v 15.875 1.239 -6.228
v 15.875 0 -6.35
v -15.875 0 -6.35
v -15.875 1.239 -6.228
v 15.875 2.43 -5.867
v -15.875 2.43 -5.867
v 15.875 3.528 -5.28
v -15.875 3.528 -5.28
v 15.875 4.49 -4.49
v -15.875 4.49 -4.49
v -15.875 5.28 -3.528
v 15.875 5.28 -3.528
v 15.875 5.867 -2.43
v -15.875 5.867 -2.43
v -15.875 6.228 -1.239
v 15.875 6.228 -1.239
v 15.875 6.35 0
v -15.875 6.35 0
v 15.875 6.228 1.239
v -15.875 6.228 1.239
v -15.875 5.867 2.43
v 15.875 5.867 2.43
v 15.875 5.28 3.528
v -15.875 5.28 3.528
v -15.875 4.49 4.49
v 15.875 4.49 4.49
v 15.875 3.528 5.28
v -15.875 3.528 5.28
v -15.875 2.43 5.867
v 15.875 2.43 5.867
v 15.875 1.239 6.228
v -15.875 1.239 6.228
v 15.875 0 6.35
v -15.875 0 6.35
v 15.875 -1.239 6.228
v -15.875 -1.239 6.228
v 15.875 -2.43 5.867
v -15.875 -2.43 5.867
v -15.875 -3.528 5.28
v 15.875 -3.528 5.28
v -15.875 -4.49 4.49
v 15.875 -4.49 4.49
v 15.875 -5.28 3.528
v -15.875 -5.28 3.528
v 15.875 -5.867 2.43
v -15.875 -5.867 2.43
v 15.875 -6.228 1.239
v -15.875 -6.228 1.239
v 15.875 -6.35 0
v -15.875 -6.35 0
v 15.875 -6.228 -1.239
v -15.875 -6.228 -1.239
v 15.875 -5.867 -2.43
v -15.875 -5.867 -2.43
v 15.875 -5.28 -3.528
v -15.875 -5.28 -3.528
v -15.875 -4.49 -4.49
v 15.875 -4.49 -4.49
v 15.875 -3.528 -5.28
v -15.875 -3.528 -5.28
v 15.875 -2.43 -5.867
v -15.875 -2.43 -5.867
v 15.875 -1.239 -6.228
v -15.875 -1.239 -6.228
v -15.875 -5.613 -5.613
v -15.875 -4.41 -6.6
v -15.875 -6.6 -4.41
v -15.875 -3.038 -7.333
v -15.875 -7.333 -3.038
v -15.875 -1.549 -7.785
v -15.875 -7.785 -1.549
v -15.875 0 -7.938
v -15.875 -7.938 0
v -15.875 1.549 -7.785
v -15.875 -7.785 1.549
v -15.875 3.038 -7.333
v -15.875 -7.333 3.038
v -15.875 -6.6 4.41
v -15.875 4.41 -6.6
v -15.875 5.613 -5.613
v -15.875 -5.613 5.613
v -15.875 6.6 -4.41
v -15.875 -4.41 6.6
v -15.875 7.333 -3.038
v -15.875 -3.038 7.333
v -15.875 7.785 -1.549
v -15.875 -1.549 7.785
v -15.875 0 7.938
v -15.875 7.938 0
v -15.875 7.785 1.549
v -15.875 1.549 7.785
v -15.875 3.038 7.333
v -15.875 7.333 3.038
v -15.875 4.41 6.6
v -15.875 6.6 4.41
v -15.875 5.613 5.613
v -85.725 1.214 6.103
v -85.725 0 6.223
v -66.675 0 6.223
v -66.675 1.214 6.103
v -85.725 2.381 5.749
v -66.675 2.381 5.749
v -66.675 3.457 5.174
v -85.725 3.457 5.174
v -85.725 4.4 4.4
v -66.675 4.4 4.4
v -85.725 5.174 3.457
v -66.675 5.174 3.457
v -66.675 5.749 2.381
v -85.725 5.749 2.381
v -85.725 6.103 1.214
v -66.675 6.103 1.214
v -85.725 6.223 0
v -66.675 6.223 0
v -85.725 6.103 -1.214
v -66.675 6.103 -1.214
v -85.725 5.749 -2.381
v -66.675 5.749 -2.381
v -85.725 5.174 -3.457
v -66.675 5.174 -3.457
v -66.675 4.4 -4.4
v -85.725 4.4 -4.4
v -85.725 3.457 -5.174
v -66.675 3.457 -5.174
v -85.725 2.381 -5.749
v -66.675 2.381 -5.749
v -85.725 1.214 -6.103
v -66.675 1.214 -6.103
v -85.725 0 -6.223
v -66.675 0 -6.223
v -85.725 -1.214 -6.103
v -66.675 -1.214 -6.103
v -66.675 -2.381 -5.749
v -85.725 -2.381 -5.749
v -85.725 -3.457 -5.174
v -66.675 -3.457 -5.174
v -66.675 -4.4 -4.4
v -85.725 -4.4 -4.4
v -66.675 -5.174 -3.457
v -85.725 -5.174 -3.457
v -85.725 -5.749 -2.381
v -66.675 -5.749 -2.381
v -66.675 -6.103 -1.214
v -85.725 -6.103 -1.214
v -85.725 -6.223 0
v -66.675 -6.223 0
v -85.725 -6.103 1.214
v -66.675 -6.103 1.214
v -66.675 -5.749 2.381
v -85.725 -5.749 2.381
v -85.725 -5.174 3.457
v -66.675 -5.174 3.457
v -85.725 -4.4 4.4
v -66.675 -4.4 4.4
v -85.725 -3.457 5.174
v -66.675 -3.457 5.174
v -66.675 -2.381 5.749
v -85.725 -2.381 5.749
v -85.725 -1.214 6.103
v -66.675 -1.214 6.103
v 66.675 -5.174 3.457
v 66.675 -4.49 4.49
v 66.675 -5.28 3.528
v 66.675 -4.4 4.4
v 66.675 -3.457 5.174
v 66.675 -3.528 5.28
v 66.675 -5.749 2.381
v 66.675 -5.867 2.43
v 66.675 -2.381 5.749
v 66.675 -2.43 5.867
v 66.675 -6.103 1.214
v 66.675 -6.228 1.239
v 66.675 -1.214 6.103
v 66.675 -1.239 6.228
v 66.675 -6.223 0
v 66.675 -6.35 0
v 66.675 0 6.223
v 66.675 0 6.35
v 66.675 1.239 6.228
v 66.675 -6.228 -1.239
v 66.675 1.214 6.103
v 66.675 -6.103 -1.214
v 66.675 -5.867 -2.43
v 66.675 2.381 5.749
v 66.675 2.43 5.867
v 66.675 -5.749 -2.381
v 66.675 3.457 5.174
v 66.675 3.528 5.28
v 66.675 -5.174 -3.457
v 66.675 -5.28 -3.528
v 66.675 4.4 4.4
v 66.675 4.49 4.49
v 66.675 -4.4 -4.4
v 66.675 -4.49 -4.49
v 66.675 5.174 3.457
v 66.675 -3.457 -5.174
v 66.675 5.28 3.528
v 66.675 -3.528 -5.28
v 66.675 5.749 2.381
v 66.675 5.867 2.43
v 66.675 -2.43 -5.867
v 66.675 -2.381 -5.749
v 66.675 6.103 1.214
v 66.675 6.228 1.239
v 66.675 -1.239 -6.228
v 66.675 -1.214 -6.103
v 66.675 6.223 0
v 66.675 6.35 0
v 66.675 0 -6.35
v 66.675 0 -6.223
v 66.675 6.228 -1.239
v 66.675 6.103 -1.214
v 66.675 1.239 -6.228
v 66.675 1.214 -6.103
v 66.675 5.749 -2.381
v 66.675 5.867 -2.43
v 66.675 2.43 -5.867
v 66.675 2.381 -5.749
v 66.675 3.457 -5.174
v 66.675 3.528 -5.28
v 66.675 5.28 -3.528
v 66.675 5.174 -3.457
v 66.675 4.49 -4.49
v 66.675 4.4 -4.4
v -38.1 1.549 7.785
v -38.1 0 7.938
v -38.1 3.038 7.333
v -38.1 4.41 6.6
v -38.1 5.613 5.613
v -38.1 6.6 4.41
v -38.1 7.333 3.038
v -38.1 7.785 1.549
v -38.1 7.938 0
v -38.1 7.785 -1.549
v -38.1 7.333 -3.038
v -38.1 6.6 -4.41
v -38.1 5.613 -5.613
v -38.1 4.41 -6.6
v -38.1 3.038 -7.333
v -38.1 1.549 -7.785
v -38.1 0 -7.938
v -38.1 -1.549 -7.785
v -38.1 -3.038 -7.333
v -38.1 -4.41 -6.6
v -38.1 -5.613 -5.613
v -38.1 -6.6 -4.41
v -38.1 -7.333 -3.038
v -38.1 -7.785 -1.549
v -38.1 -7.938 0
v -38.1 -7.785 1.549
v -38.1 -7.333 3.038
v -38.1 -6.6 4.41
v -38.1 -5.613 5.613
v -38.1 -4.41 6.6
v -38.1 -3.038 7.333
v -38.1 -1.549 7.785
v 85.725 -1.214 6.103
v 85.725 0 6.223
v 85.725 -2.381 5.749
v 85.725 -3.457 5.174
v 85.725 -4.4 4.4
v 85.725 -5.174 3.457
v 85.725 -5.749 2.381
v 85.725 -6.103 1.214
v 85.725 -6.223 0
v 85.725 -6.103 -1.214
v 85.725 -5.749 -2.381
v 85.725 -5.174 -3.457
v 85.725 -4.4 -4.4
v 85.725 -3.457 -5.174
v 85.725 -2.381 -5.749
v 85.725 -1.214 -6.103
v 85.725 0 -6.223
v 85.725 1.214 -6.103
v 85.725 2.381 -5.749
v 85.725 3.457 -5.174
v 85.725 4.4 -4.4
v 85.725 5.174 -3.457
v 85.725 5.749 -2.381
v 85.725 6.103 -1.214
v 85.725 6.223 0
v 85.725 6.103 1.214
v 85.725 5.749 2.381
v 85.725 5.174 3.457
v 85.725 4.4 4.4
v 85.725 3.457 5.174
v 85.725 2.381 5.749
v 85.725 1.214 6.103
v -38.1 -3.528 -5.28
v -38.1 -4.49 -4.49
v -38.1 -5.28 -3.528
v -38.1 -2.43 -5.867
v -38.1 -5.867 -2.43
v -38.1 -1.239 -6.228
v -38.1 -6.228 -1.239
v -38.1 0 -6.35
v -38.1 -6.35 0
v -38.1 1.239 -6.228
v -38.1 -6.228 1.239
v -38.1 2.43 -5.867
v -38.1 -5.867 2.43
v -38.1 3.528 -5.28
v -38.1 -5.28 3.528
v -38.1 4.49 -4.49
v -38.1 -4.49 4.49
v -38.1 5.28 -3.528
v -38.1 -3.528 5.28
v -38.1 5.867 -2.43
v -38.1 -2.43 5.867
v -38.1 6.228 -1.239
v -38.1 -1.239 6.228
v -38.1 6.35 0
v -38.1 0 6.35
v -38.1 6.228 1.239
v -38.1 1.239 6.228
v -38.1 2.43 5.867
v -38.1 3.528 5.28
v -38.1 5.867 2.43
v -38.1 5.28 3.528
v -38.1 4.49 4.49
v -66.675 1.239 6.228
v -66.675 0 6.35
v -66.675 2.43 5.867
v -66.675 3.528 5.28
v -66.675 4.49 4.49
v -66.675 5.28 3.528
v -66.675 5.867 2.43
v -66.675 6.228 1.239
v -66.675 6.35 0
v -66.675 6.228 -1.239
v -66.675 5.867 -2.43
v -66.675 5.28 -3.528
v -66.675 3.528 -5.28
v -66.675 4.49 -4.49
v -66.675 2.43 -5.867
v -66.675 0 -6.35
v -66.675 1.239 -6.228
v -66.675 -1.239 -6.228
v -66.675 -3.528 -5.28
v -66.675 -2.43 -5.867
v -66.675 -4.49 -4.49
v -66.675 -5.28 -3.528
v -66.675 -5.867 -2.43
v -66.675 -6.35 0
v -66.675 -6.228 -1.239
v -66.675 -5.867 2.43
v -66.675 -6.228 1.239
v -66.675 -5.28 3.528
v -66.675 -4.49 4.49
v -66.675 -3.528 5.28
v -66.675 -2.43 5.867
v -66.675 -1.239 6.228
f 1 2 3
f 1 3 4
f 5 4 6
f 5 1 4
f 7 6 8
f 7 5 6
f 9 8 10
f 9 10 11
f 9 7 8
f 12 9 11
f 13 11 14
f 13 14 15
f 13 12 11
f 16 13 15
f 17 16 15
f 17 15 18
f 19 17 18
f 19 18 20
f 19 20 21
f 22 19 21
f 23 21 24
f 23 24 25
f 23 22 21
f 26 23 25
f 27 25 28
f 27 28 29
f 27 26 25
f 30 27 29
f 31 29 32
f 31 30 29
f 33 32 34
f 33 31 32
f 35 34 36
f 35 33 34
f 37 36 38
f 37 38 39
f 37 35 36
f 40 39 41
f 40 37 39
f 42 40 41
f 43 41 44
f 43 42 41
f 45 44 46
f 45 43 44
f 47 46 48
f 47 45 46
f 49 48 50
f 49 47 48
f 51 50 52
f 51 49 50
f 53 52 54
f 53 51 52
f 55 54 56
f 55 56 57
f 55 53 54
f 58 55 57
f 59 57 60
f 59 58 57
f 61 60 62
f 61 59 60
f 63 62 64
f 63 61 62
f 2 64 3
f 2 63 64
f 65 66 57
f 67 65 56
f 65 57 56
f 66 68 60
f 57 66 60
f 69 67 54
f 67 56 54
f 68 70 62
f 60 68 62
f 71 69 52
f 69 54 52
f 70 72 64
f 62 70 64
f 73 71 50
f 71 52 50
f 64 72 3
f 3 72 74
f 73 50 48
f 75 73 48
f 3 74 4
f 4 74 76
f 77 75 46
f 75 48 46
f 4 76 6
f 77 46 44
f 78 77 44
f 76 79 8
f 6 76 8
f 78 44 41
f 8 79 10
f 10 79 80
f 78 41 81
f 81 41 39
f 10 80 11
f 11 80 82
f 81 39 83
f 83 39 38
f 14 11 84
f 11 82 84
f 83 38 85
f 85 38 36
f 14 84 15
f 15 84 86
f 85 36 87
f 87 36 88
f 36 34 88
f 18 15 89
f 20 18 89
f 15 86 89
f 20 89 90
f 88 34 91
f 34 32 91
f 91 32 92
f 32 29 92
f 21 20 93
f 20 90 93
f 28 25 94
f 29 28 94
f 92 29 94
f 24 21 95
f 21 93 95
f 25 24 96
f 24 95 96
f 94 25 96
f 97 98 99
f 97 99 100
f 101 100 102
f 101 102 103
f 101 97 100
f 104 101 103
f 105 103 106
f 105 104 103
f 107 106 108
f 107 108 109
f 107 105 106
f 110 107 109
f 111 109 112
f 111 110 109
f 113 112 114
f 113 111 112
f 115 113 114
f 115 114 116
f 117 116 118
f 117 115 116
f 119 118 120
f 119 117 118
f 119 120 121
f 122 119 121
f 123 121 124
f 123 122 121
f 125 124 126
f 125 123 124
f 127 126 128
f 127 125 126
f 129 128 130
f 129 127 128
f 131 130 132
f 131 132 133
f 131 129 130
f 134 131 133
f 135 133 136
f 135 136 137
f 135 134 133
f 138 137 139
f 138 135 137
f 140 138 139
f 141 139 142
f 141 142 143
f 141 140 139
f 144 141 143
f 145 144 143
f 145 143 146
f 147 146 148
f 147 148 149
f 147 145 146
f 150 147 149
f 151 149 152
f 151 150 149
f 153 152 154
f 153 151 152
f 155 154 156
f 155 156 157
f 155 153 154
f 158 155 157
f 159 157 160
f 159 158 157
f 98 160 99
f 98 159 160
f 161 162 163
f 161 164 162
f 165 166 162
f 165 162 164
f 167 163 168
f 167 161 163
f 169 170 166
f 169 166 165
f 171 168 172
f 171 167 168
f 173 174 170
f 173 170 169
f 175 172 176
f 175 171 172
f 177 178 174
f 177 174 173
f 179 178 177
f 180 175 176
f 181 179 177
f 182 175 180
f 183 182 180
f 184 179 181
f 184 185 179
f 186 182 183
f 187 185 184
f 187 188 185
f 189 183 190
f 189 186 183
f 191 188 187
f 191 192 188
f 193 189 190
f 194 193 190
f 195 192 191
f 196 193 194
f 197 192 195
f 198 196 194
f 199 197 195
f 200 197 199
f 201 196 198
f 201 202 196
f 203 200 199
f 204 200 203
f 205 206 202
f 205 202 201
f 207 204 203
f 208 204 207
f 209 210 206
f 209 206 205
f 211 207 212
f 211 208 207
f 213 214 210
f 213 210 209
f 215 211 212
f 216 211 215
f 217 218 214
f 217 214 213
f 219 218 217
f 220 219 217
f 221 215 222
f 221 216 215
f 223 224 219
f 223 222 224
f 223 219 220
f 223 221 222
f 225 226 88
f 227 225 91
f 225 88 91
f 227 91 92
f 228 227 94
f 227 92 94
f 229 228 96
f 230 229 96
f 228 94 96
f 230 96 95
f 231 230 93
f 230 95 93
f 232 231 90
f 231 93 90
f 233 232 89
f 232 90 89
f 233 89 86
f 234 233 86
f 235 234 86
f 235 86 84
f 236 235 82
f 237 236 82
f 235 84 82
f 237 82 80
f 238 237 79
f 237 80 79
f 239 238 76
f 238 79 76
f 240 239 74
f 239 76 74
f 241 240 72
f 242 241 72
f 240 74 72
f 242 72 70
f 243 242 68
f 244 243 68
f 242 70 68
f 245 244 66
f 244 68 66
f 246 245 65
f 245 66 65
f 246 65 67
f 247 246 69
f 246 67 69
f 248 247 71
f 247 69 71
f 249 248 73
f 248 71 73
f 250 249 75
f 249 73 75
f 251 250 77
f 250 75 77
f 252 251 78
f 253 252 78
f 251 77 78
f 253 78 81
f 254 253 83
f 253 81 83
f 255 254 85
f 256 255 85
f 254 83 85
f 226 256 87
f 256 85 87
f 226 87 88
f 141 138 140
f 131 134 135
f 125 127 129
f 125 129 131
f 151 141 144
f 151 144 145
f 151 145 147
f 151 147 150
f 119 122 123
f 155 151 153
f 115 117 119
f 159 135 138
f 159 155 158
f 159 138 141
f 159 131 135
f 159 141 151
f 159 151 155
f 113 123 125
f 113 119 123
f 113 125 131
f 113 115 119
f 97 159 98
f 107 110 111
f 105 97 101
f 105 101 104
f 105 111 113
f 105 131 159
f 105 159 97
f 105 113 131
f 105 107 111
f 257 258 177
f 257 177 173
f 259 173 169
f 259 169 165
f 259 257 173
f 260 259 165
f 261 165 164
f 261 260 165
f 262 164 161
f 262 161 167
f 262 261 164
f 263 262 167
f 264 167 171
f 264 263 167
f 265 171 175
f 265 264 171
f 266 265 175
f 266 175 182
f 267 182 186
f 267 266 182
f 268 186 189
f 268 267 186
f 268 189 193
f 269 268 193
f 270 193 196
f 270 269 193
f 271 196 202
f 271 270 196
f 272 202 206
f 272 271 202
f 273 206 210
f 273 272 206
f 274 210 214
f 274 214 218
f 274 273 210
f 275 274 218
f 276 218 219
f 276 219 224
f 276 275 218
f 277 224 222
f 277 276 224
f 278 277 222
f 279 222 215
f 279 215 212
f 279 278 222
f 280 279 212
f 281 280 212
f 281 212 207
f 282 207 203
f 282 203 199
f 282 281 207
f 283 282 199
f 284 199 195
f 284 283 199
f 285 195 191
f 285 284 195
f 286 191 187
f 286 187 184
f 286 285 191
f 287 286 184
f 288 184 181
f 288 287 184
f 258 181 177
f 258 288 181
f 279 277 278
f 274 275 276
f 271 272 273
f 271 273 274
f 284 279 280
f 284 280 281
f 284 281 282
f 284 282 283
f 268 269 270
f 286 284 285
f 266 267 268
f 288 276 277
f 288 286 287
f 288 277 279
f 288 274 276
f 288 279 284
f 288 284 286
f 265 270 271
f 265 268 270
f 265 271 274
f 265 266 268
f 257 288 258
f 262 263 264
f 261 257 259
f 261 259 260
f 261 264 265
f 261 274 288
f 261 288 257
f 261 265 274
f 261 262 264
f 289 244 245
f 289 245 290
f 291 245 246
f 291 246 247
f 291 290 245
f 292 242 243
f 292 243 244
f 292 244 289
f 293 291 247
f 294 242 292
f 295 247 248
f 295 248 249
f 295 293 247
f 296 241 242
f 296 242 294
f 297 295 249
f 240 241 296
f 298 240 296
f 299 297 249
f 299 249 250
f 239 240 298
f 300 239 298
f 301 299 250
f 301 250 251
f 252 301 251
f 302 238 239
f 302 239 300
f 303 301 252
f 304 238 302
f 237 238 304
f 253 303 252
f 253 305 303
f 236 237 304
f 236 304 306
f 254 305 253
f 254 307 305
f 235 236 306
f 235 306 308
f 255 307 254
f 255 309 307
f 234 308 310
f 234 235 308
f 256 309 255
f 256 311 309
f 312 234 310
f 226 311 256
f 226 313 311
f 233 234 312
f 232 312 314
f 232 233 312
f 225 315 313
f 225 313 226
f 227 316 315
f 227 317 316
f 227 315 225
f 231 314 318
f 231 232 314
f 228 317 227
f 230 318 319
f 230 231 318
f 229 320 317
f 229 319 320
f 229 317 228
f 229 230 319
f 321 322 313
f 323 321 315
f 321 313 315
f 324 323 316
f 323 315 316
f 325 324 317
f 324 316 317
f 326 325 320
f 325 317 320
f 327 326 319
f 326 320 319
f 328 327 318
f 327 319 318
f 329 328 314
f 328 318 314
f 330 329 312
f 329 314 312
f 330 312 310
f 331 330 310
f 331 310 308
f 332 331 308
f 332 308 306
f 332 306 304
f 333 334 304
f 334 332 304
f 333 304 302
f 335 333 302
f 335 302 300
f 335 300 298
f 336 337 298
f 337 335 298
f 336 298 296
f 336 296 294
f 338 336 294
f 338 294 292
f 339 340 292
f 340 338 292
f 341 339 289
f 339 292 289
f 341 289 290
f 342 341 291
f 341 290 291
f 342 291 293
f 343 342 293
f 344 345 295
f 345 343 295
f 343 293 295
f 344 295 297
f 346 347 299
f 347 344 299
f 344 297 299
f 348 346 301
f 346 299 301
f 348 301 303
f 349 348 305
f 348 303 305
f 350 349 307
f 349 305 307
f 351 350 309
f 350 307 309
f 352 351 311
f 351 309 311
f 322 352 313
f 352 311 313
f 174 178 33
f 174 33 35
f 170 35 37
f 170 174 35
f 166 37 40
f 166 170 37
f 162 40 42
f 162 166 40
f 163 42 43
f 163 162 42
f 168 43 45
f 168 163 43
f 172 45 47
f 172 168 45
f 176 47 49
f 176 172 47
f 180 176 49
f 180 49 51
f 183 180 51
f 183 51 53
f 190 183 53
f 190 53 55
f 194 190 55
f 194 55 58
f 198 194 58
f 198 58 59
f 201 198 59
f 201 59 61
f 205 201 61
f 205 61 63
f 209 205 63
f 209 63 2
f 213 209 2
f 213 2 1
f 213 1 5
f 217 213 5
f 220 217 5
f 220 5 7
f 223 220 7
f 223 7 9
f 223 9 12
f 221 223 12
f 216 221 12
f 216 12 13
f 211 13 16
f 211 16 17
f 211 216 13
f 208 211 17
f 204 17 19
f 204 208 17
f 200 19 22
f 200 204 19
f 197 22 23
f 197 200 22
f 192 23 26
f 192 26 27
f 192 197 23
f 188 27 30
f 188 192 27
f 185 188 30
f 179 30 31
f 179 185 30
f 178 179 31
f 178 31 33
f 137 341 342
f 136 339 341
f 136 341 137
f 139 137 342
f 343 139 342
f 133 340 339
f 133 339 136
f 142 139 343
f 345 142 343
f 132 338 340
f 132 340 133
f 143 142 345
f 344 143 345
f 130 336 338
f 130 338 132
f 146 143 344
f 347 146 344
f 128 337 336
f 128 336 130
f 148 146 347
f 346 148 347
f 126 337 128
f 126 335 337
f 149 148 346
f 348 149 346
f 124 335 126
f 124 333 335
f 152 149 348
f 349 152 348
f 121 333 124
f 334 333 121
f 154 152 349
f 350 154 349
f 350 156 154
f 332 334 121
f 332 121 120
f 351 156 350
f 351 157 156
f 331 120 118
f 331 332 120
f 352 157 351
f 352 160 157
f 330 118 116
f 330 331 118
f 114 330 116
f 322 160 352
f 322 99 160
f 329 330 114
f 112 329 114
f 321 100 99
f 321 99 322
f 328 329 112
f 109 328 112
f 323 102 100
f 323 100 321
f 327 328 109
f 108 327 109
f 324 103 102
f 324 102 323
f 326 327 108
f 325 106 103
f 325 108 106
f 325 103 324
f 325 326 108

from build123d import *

# Parameters (mm, degrees)
SKETCH1_R           = 6.35
BOSS_EXTRUDE1_DEPTH = 15.875
SKETCH2_R           = 7.9375
BOSS_EXTRUDE2_DEPTH = 22.225
BOSS_EXTRUDE3_START = 69.85
SKETCH3_R           = 6.35
BOSS_EXTRUDE3_DEPTH = 69.85
SKETCH4_R           = 6.35
BOSS_EXTRUDE4_DEPTH = 47.625
SKETCH5_OUTSIDE_W   = 52.458
SKETCH5_OUTSIDE_H   = 52.458
SKETCH5_OUTSIDE_R   = 6.223
CUT_EXTRUDE3_DEPTH  = 19.05
SKETCH6_OUTSIDE_W   = 52.458
SKETCH6_OUTSIDE_H   = 52.458
SKETCH6_OUTSIDE_R   = 6.223
CUT_EXTRUDE4_DEPTH  = 19.05


with BuildPart() as part:
    # Sketch1 → Boss-Extrude1 (new, symmetric)
    with BuildSketch(Plane(origin=(0, 0, 0), x_dir=(0, 0, -1), z_dir=(1, 0, 0))):
        Circle(SKETCH1_R)
    extrude(amount=BOSS_EXTRUDE1_DEPTH, both=True)

    # Sketch2 → Boss-Extrude2 (add)
    with BuildSketch(Plane.ZY.offset(15.875)):
        Circle(SKETCH2_R)
    extrude(amount=BOSS_EXTRUDE2_DEPTH)

    # Sketch3 → Boss-Extrude3 (add)
    with BuildSketch(Plane(origin=(15.875, 0, 0), x_dir=(0, 0, -1), z_dir=(1, 0, 0)).offset(BOSS_EXTRUDE3_START)):
        with Locations(Location((0, 0, 0), (0, 0, 180))):
            Circle(SKETCH3_R)
    extrude(amount=-BOSS_EXTRUDE3_DEPTH)

    # Sketch4 → Boss-Extrude4 (add)
    with BuildSketch(Plane.ZY.offset(38.1)):
        Circle(SKETCH4_R)
    extrude(amount=BOSS_EXTRUDE4_DEPTH)

    # Sketch5 outside → Cut-Extrude3 (cut)
    with BuildSketch(Plane.ZY.offset(85.725)):
        Rectangle(SKETCH5_OUTSIDE_W, SKETCH5_OUTSIDE_H)
        Circle(SKETCH5_OUTSIDE_R, mode=Mode.SUBTRACT)
    extrude(amount=-CUT_EXTRUDE3_DEPTH, mode=Mode.SUBTRACT)

    # Sketch6 outside → Cut-Extrude4 (cut)
    with BuildSketch(Plane(origin=(85.725, 0, 0), x_dir=(0, 0, -1), z_dir=(1, 0, 0))):
        Rectangle(SKETCH6_OUTSIDE_W, SKETCH6_OUTSIDE_H)
        with Locations(Location((0, 0, 0), (0, 0, 180))):
            Circle(SKETCH6_OUTSIDE_R, mode=Mode.SUBTRACT)
    extrude(amount=-CUT_EXTRUDE4_DEPTH, mode=Mode.SUBTRACT)


solid = part.part
